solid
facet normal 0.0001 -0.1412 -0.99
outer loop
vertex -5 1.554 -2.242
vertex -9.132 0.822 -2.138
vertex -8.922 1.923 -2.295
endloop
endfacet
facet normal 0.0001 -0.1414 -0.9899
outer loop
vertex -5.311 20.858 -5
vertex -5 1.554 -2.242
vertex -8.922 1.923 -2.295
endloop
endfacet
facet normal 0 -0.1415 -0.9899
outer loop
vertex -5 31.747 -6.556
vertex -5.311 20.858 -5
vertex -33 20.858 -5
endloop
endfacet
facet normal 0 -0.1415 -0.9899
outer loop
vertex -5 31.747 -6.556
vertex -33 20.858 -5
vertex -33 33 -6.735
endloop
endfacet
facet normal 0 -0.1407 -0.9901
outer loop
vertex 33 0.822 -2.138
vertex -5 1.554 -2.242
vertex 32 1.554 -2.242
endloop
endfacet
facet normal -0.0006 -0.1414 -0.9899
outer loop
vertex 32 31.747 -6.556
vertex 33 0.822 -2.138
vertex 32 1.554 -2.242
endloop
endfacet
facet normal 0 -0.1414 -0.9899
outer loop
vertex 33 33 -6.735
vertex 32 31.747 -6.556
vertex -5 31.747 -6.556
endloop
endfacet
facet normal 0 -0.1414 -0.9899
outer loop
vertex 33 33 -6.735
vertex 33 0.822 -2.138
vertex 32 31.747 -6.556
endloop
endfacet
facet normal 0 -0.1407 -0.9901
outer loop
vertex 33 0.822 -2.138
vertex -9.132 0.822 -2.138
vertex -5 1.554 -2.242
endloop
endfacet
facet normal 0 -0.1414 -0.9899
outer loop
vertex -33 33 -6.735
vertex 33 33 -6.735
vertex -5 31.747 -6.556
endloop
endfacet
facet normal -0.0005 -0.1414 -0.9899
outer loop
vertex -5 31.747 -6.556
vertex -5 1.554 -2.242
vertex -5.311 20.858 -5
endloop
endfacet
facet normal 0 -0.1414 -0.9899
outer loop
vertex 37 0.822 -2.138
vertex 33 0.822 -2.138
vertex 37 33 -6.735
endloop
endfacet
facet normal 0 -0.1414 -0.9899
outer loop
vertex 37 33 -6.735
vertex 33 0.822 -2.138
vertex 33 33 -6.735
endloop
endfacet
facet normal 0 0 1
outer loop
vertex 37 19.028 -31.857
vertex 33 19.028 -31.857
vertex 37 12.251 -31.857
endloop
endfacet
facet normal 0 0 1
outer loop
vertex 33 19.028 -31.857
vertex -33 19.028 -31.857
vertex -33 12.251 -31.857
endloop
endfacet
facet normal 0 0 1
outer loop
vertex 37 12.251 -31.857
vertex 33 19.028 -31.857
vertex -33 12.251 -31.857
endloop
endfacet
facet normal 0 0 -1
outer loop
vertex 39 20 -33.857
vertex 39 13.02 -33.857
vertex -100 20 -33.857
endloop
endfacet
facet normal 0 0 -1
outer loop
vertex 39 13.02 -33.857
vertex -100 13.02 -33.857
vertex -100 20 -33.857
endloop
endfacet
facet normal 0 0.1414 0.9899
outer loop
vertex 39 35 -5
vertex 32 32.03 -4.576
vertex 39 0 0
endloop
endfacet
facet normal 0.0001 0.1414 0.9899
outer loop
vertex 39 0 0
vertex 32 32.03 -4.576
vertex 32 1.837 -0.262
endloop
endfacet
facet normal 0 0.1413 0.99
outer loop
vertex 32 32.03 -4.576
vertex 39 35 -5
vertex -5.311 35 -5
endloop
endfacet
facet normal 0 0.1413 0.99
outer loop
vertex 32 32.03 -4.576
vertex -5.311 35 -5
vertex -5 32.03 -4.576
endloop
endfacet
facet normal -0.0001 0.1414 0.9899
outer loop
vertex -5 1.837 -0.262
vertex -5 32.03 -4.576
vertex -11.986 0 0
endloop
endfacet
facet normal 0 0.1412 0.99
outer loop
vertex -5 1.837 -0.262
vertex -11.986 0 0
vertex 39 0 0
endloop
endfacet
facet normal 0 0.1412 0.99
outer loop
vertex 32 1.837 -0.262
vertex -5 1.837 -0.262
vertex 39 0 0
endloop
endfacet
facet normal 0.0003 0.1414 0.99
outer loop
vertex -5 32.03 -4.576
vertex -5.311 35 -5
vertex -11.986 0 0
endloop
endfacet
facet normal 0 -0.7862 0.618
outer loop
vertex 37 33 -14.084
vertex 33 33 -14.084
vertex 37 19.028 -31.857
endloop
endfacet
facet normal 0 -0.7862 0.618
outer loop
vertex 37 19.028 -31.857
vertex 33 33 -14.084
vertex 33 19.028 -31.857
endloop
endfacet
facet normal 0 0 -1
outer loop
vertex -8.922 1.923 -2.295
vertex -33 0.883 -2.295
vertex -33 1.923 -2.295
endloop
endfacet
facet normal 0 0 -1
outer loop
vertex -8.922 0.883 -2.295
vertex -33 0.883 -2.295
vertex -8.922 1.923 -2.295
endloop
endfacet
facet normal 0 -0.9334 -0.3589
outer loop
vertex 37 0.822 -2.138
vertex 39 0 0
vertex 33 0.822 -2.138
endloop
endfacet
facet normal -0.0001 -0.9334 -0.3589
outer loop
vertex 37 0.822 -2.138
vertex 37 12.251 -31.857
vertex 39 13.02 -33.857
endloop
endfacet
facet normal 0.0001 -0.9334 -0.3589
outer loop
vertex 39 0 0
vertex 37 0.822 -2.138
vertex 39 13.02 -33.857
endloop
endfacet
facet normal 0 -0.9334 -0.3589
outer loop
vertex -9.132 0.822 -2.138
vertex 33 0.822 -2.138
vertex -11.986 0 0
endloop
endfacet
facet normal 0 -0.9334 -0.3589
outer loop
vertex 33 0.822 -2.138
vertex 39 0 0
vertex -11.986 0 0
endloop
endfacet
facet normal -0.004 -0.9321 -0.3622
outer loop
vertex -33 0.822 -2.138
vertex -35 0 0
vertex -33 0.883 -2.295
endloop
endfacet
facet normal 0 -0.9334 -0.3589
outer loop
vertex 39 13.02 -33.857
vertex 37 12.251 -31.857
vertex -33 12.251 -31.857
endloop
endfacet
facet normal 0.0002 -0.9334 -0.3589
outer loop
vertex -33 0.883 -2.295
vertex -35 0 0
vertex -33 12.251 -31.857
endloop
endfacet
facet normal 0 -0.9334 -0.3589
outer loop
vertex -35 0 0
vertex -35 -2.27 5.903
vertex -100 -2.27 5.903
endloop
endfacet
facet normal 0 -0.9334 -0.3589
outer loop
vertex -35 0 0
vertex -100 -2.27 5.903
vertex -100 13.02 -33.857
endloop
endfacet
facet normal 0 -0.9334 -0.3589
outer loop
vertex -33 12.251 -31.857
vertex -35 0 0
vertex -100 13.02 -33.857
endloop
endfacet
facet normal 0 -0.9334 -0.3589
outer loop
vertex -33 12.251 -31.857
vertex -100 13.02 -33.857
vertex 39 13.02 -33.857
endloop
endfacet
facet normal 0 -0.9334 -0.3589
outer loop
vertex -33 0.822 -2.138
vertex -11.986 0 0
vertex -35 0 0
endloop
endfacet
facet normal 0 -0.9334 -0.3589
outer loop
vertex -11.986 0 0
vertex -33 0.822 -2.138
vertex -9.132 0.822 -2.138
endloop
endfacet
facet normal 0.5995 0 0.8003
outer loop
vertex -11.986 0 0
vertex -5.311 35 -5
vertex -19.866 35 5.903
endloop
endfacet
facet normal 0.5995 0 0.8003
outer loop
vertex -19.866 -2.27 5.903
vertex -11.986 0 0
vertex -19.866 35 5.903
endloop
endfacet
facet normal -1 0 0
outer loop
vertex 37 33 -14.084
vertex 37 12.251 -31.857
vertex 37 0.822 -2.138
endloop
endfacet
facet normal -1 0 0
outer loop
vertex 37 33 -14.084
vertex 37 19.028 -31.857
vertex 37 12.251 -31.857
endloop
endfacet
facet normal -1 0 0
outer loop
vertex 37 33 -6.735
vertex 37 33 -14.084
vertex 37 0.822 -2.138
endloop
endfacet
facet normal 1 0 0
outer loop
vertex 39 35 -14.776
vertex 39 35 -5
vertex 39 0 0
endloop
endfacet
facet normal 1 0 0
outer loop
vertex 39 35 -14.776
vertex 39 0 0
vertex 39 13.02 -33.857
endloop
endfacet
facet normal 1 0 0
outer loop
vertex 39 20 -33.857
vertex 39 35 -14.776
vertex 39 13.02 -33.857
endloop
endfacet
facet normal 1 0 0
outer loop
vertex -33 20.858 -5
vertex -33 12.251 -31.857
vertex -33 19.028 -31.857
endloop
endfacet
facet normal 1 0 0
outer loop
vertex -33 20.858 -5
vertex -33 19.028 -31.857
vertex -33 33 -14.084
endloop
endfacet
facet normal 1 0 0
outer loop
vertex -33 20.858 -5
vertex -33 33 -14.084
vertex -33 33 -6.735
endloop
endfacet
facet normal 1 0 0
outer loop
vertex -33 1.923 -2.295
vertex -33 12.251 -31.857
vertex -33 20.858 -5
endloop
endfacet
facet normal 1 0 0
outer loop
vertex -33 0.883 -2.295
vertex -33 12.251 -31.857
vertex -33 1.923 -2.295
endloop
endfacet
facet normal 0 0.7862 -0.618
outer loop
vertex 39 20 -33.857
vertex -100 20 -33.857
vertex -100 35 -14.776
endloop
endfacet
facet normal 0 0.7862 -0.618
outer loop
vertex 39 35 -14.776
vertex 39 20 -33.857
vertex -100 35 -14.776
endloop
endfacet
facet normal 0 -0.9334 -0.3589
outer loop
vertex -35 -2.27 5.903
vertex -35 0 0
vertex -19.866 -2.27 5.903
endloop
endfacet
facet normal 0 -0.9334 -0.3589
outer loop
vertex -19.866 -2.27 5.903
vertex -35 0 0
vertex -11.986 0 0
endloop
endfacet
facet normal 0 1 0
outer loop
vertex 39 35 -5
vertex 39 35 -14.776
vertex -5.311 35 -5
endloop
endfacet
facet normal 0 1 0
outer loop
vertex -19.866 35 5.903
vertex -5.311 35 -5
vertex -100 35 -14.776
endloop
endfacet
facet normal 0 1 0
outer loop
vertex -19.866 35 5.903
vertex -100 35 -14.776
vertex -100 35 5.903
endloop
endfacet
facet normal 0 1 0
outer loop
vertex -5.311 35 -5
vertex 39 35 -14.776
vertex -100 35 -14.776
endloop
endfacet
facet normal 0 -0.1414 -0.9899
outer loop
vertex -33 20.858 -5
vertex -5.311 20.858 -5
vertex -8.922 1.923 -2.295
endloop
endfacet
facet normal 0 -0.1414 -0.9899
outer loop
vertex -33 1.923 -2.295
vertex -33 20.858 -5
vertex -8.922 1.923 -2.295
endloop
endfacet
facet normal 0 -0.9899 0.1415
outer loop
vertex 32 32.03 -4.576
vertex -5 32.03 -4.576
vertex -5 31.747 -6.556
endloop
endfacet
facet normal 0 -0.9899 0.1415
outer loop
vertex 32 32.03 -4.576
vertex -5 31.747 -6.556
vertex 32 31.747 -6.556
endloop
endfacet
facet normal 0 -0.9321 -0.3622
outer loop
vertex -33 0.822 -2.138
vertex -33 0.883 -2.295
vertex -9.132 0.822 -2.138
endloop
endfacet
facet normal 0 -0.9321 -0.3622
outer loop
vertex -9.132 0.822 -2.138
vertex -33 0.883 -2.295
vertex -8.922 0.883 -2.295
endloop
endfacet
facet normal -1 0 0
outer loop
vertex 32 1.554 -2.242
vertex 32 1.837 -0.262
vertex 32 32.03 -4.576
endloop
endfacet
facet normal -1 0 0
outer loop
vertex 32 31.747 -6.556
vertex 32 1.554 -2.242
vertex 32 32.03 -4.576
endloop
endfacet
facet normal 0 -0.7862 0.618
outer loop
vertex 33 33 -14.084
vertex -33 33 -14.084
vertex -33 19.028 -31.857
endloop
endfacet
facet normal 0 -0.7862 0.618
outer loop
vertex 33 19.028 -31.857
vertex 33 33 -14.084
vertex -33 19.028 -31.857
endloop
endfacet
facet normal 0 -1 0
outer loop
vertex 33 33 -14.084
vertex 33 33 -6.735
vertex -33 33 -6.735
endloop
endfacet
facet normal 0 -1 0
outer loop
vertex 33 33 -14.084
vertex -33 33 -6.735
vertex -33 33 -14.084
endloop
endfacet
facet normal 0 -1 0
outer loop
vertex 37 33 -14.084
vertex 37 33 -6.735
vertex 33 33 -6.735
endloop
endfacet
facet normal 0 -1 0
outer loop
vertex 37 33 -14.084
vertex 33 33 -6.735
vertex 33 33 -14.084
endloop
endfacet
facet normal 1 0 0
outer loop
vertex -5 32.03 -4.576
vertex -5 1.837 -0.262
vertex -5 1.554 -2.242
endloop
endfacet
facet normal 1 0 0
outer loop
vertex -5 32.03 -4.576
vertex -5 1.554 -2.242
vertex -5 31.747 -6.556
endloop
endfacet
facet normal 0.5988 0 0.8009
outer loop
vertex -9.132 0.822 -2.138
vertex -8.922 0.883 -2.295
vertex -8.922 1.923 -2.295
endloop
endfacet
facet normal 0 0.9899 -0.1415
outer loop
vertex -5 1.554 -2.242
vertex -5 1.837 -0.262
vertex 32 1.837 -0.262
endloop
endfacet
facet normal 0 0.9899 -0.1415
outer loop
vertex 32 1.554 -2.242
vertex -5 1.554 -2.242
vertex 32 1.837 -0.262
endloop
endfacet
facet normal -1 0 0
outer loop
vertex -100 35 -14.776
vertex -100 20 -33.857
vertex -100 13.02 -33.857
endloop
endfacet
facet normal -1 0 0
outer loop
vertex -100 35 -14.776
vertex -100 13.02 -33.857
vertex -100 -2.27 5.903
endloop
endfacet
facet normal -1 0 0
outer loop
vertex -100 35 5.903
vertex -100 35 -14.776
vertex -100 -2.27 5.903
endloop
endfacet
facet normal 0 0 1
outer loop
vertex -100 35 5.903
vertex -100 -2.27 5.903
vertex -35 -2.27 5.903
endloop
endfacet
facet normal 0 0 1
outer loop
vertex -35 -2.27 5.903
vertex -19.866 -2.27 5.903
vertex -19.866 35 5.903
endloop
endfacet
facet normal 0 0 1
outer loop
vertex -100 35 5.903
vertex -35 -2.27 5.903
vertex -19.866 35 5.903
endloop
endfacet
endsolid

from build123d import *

# Parameters (mm, degrees)
BOSS_EXTRUDE9_DEPTH  = 35
SHELL1_T             = -2
SKETCH25_W           = 37
SKETCH25_H           = 30.5
CUT_EXTRUDE6_DEPTH   = 2
BOSS_EXTRUDE11_REACH = 61.969
CUT_EXTRUDE7_START   = -33
CUT_EXTRUDE7_DEPTH   = 27.688806668
BOSS_EXTRUDE12_DEPTH = 65
CUT_EXTRUDE9_START   = -1.04026
CUT_EXTRUDE9_DEPTH   = 1.04026
BOSS_EXTRUDE13_DEPTH = 4
CUT_EXTRUDE14_DEPTH  = 4


# Read off the part's stored shape, not the designer's step: Cut-Extrude7
with BuildPart() as part:
    # Sketch24 → Boss-Extrude9 (new, symmetric)
    with BuildSketch(Plane(origin=(0, 0, 0), x_dir=(0, 0, -1), z_dir=(1, 0, 0))):
        Polygon((0, 0), (5, 35), (14.77647195, 35), (33.857142857, 20), (33.857142857, 13.020408163), align=None)
    extrude(amount=BOSS_EXTRUDE9_DEPTH, both=True)

    # Shell1
    shell1_openings = [part.faces().sort_by_distance(p)[0] for p in [
        (0, 6.510204082, -16.928571429),
    ]]
    offset(amount=SHELL1_T, openings=shell1_openings, kind=Kind.INTERSECTION)

    # Sketch25 → Cut-Extrude6 (cut)
    with BuildSketch(Plane(origin=(0, 0, 0), x_dir=(1, 0, 0), z_dir=(0, 0.1414213562373094, 0.9899494936611667))):
        with Locations((13.5, 17.105339059)):
            Rectangle(SKETCH25_W, SKETCH25_H)
    extrude(amount=-CUT_EXTRUDE6_DEPTH, mode=Mode.SUBTRACT)

    # Boss-Extrude11: up to this plane
    boss_extrude11_end = Plane(origin=(35, 0, 0), z_dir=(0, 0.9333601055458265, 0.35894137874517024))
    # Sketch27 → Boss-Extrude11 (add, up to the surface)
    with BuildSketch(Plane(origin=(0, 35, 0), x_dir=(1, 0, 0), z_dir=(0, 1, 0)), mode=Mode.PRIVATE) as boss_extrude11_sk1:
        Polygon((-5.311193332, 5), (-19.86581292, -5.902882273), (-35, -5.902882273), (-35, 5), align=None)
    boss_extrude11_tool1 = split(extrude(boss_extrude11_sk1.sketch, amount=-BOSS_EXTRUDE11_REACH, mode=Mode.PRIVATE), bisect_by=boss_extrude11_end, keep=Keep.BOTH, mode=Mode.PRIVATE)
    add(boss_extrude11_tool1.solids().sort_by_distance((-23.400412, 35, -0.138611))[0])

    # Cut-Extrude7 outline → Cut-Extrude7 (cut)
    with BuildSketch(Plane.YZ.offset(CUT_EXTRUDE7_START)):
        Polygon((20.857864376, -5), (1.922845087, -2.294997245), (1.922845087, -5), align=None)
    extrude(amount=CUT_EXTRUDE7_DEPTH, mode=Mode.SUBTRACT)

    # Sketch30 → Boss-Extrude12 (add)
    with BuildSketch(Plane.ZY.offset(35)):
        Polygon((-33.857142857, 20), (-33.857142857, 13.020408163), (5.902882273, -2.270065636), (5.902882273, 35), (-14.77647195, 35), align=None)
    extrude(amount=BOSS_EXTRUDE12_DEPTH)

    # Sketch31 → Cut-Extrude9 (cut)
    with BuildSketch(Plane(origin=(0, 1.922845087, 0), x_dir=(1, 0, 0), z_dir=(0, 1, 0)).offset(CUT_EXTRUDE9_START)):
        Polygon((-8.922191333, 2.294997244), (-5.311193332, 5), (-33, 5), (-33, 2.294997244), align=None)
    extrude(amount=CUT_EXTRUDE9_DEPTH, mode=Mode.SUBTRACT)

    # Sketch26 → Boss-Extrude13 (add)
    with BuildSketch(Plane(origin=(35, 0, 0), x_dir=(0, 0, -1), z_dir=(1, 0, 0))):
        Polygon((5, 35), (0, 0), (33.857142857, 13.020408163), (33.857142857, 20), (14.77647195, 35), align=None)
    extrude(amount=BOSS_EXTRUDE13_DEPTH)

    # Sketch36 → Cut-Extrude14 (cut)
    with BuildSketch(Plane.ZY.offset(-33)):
        Polygon((-31.857142857, 12.251270128), (-2.137749704, 0.822112303), (-6.734590803, 33), (-14.084453997, 33), (-31.857142857, 19.028251617), align=None)
    extrude(amount=-CUT_EXTRUDE14_DEPTH, mode=Mode.SUBTRACT)


solid = part.part
